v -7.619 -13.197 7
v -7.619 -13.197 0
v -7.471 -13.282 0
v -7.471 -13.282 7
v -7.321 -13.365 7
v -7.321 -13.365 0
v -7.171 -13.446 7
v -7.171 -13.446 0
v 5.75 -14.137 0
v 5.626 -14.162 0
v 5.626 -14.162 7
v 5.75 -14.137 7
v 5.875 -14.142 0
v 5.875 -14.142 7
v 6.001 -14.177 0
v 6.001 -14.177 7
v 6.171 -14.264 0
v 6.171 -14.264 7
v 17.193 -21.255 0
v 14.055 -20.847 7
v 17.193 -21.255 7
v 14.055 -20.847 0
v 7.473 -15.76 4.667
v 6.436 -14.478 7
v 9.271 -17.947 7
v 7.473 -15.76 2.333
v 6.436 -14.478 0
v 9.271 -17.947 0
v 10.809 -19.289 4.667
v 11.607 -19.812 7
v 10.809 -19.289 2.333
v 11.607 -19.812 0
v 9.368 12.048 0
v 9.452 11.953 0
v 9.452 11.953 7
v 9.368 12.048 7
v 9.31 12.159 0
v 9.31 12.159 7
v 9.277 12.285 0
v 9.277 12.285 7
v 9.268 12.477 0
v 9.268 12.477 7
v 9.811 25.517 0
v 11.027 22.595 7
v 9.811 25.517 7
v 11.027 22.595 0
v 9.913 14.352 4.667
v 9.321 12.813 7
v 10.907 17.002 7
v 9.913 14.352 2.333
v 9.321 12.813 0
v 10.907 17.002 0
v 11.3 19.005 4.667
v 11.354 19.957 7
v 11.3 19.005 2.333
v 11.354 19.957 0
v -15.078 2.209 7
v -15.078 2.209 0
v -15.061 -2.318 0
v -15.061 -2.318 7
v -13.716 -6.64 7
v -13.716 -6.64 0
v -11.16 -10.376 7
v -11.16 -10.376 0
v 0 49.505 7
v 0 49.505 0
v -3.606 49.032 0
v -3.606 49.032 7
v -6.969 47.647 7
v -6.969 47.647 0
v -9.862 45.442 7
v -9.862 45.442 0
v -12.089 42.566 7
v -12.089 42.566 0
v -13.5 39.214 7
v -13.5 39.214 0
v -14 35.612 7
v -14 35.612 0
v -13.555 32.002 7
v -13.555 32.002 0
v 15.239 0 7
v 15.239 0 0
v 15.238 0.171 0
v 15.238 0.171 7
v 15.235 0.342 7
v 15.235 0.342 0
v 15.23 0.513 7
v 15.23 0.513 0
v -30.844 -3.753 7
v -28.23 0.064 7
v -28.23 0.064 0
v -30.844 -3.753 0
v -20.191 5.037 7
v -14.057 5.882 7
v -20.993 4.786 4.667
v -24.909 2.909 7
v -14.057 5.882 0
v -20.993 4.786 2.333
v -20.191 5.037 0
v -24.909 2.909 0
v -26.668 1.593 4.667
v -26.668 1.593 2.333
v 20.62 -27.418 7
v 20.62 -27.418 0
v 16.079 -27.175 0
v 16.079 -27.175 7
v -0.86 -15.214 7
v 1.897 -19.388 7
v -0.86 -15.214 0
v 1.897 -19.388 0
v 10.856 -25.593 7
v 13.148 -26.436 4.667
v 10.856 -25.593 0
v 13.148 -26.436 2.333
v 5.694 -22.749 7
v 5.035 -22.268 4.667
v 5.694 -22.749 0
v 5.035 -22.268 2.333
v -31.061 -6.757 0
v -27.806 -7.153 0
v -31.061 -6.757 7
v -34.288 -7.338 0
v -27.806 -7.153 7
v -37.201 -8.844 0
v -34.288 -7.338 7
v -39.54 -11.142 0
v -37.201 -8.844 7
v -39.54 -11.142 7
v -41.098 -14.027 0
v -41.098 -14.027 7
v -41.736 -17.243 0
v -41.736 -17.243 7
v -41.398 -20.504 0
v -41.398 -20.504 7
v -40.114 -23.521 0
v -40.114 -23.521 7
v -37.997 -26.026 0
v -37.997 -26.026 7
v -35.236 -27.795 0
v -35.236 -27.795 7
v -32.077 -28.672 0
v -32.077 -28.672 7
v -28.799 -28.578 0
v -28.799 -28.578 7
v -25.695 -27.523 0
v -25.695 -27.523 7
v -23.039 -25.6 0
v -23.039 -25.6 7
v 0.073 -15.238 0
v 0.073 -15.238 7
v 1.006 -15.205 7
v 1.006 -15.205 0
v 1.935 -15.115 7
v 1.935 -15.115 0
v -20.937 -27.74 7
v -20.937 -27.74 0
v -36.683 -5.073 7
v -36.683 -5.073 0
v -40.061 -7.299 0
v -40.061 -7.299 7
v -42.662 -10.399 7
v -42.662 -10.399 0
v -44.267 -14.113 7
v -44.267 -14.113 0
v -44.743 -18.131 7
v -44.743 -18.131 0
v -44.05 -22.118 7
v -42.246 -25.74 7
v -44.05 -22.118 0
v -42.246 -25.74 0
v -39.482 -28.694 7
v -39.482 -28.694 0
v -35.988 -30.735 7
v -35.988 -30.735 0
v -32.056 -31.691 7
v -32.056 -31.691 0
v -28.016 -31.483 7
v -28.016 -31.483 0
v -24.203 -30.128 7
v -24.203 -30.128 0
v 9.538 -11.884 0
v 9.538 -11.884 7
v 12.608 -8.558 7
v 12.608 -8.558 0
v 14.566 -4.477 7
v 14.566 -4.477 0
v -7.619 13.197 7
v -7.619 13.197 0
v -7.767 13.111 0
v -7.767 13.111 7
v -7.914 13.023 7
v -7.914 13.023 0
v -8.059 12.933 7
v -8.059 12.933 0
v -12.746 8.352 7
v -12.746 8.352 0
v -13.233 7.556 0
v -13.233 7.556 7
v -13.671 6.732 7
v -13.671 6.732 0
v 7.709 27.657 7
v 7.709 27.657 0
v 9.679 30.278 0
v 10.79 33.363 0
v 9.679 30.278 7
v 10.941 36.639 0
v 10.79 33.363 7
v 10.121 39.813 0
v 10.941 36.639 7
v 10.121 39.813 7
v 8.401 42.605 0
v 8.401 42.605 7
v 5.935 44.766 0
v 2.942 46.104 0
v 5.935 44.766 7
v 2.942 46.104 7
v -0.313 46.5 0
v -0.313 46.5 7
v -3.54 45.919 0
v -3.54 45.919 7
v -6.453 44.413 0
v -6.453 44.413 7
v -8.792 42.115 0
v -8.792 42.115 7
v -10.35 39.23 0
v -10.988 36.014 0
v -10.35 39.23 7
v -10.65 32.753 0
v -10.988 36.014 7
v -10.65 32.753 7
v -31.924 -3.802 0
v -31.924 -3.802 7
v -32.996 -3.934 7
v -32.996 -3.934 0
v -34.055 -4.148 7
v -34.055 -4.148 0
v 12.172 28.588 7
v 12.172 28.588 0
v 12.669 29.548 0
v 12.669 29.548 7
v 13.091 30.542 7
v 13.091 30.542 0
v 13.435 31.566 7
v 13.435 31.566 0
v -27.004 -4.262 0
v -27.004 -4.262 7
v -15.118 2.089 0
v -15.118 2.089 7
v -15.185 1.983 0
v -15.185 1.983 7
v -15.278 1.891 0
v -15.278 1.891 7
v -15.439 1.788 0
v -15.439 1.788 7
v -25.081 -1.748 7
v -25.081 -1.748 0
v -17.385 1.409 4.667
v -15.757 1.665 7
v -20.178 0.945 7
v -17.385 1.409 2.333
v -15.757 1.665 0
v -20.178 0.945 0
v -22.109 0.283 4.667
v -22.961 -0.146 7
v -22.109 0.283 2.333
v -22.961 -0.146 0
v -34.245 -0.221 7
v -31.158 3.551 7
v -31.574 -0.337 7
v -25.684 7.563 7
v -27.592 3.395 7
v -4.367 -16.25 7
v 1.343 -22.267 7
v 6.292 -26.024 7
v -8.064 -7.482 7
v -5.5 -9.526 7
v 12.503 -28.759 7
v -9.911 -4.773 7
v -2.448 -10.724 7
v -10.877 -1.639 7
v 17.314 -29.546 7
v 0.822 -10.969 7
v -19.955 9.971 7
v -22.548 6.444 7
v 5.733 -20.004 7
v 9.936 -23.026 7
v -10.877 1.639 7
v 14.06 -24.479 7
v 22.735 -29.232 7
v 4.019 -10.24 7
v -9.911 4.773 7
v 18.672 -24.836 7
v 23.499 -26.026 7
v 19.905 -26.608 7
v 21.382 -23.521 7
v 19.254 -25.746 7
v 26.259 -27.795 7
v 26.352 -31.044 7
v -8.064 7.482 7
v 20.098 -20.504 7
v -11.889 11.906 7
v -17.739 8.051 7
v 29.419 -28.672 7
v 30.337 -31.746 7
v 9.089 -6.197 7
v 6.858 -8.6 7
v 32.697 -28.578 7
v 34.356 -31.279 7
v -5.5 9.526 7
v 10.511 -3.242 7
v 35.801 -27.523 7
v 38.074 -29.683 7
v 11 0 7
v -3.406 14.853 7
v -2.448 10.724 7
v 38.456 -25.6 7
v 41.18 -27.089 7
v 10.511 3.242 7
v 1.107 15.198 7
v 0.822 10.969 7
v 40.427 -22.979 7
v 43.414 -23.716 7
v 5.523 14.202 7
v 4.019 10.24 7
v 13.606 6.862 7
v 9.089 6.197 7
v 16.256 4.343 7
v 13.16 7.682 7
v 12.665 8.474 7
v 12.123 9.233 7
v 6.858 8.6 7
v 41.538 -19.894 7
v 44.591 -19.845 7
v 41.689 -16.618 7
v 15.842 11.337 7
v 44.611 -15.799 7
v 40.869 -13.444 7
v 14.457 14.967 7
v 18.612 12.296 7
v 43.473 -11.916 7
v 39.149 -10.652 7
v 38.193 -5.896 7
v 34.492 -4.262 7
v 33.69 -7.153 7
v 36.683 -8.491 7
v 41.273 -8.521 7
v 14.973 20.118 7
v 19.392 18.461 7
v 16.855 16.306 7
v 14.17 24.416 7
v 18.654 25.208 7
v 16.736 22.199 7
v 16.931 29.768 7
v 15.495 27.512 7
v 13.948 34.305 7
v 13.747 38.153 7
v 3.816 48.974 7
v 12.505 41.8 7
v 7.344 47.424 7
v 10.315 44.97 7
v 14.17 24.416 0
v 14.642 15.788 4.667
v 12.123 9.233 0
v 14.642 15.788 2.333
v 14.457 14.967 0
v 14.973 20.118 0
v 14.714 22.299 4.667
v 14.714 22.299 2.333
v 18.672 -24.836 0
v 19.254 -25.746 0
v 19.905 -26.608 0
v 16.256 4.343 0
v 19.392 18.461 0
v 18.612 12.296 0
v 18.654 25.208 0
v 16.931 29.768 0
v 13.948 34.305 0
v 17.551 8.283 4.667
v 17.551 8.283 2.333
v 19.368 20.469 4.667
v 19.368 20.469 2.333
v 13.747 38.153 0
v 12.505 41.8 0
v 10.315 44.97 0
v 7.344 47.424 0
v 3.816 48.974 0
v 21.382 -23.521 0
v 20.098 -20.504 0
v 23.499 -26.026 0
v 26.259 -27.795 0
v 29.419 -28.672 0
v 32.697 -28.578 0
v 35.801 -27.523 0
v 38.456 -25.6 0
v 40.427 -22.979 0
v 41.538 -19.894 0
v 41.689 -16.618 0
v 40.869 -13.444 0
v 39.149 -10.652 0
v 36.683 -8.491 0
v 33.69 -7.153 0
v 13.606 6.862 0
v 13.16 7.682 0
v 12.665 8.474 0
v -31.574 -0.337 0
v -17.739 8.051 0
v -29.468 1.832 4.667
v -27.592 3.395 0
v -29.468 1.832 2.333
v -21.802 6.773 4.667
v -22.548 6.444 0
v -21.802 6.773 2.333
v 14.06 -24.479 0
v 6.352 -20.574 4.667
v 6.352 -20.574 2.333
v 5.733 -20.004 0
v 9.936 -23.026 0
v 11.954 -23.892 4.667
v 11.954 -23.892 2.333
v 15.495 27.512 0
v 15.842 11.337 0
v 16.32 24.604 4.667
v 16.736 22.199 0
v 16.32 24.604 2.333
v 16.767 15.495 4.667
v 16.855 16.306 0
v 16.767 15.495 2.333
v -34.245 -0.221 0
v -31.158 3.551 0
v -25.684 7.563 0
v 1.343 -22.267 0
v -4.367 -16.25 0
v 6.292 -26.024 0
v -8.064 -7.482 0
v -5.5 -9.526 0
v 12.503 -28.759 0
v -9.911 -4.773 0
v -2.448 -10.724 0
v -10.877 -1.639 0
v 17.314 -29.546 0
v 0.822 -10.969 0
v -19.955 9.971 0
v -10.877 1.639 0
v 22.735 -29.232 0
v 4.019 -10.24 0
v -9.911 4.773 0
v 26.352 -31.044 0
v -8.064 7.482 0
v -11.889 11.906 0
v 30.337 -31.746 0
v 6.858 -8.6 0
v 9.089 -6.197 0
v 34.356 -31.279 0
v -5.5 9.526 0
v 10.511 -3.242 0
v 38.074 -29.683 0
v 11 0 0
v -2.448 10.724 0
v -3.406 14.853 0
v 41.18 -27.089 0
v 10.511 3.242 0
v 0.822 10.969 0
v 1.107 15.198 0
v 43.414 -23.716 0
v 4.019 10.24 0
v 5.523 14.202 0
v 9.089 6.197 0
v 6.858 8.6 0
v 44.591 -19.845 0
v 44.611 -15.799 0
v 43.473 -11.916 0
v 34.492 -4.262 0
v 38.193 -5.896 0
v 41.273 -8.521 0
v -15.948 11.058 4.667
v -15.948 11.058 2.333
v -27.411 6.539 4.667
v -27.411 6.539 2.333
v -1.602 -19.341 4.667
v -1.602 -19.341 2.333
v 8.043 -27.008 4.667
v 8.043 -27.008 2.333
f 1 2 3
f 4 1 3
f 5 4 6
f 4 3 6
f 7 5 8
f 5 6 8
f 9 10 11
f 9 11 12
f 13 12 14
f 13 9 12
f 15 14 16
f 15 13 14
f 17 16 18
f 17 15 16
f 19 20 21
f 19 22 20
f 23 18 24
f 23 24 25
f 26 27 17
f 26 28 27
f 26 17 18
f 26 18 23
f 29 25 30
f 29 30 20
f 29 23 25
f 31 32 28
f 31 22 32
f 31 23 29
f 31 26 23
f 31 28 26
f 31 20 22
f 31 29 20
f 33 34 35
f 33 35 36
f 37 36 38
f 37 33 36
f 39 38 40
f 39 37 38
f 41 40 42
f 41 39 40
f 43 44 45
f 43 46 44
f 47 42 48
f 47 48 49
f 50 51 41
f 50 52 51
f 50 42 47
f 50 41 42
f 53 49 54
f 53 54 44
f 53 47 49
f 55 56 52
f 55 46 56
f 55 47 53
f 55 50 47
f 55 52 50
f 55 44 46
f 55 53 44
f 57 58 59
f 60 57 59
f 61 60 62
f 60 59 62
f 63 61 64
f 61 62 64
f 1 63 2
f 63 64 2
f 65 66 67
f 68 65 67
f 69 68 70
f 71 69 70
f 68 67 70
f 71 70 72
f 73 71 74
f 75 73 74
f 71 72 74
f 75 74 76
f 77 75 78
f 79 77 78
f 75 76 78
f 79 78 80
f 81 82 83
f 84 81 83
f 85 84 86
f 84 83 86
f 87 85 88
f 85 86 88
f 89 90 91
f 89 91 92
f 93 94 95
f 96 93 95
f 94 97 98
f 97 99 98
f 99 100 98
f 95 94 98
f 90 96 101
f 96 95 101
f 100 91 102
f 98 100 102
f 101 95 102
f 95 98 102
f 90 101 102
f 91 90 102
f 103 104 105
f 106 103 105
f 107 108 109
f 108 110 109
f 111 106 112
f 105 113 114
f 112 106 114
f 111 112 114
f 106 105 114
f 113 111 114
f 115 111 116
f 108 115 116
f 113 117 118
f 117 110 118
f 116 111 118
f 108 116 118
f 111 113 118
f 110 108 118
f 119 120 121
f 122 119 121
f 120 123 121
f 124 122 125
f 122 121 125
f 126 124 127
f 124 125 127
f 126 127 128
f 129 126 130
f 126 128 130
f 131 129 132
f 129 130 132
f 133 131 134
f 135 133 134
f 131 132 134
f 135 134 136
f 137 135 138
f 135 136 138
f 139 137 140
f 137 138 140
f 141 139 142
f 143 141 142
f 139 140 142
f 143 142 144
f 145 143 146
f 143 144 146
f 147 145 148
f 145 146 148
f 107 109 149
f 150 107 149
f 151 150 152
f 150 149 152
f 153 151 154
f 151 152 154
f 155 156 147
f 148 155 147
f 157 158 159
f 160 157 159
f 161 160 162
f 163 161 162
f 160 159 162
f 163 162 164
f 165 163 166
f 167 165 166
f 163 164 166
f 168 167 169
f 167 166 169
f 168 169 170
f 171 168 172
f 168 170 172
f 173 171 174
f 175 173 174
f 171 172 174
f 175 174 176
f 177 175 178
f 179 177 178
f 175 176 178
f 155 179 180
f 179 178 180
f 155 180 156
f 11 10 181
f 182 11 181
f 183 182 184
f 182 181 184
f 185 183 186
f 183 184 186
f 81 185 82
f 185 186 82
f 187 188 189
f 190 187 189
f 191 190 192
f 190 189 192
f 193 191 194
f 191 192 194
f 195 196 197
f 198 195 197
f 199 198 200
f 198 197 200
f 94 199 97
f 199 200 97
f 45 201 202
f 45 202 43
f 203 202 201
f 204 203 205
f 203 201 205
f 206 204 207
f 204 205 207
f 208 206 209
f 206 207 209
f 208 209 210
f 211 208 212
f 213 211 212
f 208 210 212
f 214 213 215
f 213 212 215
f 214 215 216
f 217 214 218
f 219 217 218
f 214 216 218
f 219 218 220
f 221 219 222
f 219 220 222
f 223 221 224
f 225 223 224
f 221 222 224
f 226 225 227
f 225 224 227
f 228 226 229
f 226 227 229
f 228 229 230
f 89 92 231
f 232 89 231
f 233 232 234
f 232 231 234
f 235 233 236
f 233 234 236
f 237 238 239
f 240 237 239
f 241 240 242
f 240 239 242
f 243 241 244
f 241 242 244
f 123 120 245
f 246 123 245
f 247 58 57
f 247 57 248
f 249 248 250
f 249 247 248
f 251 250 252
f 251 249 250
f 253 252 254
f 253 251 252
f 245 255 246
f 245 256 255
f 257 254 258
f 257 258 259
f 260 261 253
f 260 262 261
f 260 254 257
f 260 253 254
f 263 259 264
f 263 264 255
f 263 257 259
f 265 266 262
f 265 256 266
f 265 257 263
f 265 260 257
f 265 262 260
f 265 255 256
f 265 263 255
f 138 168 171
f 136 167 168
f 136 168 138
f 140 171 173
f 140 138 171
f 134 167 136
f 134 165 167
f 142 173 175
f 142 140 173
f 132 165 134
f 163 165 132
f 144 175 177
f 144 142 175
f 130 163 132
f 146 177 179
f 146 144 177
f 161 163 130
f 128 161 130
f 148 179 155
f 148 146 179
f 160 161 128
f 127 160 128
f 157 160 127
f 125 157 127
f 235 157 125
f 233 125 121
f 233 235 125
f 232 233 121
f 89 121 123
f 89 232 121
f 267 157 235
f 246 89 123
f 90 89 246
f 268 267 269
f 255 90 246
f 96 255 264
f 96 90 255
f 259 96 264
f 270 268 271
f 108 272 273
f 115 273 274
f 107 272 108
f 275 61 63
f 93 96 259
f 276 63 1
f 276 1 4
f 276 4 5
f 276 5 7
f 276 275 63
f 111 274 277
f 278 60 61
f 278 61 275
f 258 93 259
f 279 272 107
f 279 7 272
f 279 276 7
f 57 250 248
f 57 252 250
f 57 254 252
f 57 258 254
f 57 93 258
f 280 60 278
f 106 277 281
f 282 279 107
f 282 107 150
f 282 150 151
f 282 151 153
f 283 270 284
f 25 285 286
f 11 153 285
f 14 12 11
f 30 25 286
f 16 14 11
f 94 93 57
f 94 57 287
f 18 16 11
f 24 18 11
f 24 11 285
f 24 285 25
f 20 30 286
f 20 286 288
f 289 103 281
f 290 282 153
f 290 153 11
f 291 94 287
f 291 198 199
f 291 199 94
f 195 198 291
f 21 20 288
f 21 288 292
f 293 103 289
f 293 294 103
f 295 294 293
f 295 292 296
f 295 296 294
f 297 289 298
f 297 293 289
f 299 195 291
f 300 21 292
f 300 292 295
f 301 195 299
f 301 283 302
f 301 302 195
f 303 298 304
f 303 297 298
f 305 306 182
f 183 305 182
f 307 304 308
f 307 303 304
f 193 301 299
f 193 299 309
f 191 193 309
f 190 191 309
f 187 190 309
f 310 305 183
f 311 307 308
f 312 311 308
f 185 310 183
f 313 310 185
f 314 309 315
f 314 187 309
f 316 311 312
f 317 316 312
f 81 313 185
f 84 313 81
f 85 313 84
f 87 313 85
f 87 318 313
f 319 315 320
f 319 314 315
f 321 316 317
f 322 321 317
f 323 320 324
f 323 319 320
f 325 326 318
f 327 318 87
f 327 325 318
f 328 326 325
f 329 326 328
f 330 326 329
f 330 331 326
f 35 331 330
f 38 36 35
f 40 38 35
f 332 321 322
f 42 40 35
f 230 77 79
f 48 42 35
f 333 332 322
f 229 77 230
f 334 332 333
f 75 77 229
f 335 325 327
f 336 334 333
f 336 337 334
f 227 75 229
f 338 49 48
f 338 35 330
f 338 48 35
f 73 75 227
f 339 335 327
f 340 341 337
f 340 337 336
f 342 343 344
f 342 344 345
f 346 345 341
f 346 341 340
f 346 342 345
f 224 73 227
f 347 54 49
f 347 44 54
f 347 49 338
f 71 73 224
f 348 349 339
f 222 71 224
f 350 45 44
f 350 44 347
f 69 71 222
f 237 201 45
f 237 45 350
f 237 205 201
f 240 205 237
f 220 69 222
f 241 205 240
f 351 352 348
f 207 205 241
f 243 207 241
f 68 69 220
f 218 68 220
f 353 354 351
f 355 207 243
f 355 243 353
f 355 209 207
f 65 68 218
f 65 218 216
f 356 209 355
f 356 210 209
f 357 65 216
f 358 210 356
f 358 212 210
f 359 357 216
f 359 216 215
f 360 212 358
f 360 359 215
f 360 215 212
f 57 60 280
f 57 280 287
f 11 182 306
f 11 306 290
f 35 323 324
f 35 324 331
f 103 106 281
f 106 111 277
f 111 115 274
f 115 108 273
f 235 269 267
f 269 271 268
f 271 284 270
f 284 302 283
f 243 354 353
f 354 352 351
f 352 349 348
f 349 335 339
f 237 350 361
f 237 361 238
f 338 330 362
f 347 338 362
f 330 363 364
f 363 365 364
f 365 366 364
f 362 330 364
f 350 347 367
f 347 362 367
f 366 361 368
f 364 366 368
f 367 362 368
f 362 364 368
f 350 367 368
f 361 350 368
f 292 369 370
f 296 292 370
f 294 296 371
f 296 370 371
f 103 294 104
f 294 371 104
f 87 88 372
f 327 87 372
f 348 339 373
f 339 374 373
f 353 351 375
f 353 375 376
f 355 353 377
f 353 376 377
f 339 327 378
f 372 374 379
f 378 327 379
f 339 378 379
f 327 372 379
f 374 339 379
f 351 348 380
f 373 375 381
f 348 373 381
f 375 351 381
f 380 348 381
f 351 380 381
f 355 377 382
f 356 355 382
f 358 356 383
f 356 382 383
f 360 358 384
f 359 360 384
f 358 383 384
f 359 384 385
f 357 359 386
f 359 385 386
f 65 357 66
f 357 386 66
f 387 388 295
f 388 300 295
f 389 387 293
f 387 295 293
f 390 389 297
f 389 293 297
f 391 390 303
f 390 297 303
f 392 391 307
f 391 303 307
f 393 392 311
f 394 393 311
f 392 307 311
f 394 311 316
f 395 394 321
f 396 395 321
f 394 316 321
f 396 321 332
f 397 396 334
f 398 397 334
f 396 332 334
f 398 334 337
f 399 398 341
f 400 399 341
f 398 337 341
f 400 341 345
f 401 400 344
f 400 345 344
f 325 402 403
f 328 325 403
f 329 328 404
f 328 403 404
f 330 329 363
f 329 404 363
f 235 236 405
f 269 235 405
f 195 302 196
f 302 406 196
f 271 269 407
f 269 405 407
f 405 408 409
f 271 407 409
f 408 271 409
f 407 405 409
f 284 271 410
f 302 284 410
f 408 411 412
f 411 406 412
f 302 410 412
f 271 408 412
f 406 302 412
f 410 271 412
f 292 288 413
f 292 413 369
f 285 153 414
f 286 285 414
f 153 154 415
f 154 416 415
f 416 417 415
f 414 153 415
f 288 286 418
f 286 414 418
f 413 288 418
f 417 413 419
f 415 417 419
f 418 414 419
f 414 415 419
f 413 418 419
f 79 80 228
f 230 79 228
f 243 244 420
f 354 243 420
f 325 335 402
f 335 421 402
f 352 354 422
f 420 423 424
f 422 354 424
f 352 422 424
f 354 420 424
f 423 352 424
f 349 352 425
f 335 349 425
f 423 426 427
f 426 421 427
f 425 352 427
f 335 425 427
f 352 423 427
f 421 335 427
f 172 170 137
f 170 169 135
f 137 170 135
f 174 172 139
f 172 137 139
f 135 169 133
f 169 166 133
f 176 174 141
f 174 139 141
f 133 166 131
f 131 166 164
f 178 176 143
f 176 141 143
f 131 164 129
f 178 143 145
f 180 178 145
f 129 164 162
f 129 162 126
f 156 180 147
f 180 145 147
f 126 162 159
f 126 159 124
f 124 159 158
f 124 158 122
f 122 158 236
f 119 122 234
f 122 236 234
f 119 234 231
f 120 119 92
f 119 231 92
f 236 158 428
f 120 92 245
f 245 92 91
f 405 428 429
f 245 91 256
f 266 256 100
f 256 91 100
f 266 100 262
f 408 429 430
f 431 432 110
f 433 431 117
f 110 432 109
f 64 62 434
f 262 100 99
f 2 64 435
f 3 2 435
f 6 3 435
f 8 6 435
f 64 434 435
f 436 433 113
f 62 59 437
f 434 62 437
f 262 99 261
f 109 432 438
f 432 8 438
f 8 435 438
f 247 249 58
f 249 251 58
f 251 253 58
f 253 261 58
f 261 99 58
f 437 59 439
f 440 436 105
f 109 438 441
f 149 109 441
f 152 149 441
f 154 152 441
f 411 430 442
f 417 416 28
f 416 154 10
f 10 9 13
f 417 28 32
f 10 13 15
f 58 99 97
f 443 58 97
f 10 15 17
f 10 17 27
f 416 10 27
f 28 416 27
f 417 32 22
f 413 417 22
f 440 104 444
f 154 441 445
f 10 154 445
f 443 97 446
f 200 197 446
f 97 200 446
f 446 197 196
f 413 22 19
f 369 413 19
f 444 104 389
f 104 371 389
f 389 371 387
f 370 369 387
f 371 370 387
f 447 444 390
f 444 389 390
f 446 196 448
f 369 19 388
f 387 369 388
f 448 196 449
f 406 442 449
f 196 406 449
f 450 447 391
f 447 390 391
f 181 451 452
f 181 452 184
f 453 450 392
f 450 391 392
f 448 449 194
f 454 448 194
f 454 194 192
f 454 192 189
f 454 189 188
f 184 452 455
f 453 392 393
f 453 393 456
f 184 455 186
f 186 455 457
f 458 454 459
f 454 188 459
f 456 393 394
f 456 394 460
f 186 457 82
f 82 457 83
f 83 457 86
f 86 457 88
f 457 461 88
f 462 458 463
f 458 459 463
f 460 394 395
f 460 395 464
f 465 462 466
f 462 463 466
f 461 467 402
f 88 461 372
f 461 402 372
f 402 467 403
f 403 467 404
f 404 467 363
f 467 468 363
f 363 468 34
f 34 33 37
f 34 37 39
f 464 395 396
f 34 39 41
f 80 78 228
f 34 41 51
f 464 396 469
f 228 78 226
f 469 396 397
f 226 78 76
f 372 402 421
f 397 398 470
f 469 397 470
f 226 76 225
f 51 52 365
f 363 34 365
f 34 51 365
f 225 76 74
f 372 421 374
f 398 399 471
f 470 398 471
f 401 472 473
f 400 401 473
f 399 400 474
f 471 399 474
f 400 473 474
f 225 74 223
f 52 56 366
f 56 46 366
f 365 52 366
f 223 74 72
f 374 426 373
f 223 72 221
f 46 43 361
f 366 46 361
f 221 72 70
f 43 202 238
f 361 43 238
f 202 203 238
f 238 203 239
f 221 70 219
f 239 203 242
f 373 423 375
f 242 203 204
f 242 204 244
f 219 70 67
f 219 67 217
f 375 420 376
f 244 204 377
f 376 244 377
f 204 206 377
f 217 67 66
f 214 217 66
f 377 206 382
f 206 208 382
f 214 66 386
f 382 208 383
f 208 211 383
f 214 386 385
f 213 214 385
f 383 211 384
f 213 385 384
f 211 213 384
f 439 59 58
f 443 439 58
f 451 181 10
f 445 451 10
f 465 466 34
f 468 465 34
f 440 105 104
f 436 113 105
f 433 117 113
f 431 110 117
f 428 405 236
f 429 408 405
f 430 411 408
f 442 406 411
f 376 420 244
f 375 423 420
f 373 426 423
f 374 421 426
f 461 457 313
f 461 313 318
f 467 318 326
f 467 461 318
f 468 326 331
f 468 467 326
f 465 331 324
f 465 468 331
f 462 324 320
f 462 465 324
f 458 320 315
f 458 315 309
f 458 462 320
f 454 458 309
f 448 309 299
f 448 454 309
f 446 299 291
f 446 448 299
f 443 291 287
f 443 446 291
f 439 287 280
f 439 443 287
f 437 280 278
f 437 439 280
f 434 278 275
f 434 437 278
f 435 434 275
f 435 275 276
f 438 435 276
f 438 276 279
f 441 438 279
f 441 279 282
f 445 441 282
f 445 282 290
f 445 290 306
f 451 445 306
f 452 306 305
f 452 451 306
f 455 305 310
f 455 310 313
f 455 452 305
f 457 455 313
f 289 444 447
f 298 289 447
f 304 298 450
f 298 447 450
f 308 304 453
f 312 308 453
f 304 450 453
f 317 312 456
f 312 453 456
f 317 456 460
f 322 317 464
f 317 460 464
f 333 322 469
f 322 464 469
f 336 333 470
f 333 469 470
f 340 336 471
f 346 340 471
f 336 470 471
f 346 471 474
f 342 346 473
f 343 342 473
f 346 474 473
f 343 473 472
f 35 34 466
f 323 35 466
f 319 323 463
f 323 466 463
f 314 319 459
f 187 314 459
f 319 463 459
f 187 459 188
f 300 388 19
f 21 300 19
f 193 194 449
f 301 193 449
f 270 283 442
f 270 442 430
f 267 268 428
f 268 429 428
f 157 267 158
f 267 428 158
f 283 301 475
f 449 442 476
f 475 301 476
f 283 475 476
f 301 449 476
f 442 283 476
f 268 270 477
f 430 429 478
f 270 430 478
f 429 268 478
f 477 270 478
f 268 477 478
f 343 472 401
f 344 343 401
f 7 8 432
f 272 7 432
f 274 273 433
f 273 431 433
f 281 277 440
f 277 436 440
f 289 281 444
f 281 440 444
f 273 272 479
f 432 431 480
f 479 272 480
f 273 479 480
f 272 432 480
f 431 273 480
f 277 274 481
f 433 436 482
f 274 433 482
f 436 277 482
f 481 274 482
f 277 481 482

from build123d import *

# Parameters (mm, degrees)
F0_R     = 11
F1_DEPTH = 7
F2_D     = 22


with BuildPart() as f1:
    # F0 (on Top) → F1 (new body)
    with BuildSketch(Plane.XY):
        with BuildLine():
            Line((0, 49.5046585807), (0, 48.5046585807))
            Line((0, 48.5046585807), (0, 46.5046585807))
            ThreePointArc((0, 46.5046585807), (10.1813410196, 39.6688265699), (7.7085117019, 27.6574394974))
            Line((7.7085117019, 27.6574394974), (9.8108330751, 25.5172888383))
            ThreePointArc((9.8108330751, 25.5172888383), (11.0983257909, 26.9707752537), (12.1723308709, 28.588419634))
            ThreePointArc((12.1723308709, 28.588419634), (12.8897911228, 30.0408426238), (13.4346674784, 31.566421698))
            ThreePointArc((13.4346674784, 31.566421698), (13.7598632413, 32.9227671072), (13.9484835753, 34.3047394379))
            ThreePointArc((13.9484835753, 34.3047394379), (10.3150101309, 44.970416131), (0, 49.5046585807))
        make_face()
        with BuildLine():
            Line((0, 46.5046585807), (0, 48.5046585807))
            Line((0, 48.5046585807), (0, 49.5046585807))
            ThreePointArc((0, 49.5046585807), (-11.068840076, 44.0767516373), (-13.5547324515, 32.0019127766))
            Line((-13.5547324515, 32.0019127766), (-10.6501469262, 32.7525011632))
            ThreePointArc((-10.6501469262, 32.7525011632), (-8.696945774, 42.2398745538), (0, 46.5046585807))
        make_face()
        with BuildLine():
            ThreePointArc((7.7085117019, 27.6574394974), (10.1813410196, 39.6688265699), (0, 46.5046585807))
            Line((0, 46.5046585807), (0, 39.5046585807))
            ThreePointArc((0, 39.5046585807), (2.8284271247, 38.3330857055), (4, 35.5046585807))
            ThreePointArc((4, 35.5046585807), (3.6886569817, 33.9574644522), (2.8030951643, 32.6511243686))
            Line((2.8030951643, 32.6511243686), (7.7085117019, 27.6574394974))
        make_face()
        with BuildLine():
            Line((0, 39.5046585807), (0, 46.5046585807))
            ThreePointArc((0, 46.5046585807), (-8.696945774, 42.2398745538), (-10.6501469262, 32.7525011632))
            Line((-10.6501469262, 32.7525011632), (-3.8727807004, 34.5038740653))
            ThreePointArc((-3.8727807004, 34.5038740653), (-3.162525736, 37.9538280255), (0, 39.5046585807))
        make_face()
        with BuildLine():
            ThreePointArc((4, 35.5046585807), (2.8284271247, 38.3330857055), (0, 39.5046585807))
            Line((0, 39.5046585807), (0, 35.5046585807))
            Line((0, 35.5046585807), (2.8030951643, 32.6511243686))
            ThreePointArc((2.8030951643, 32.6511243686), (3.6886569817, 33.9574644522), (4, 35.5046585807))
        make_face()
        with BuildLine():
            Line((0, 35.5046585807), (0, 39.5046585807))
            ThreePointArc((0, 39.5046585807), (-3.162525736, 37.9538280255), (-3.8727807004, 34.5038740653))
            Line((-3.8727807004, 34.5038740653), (0, 35.5046585807))
        make_face()
        with BuildLine():
            add(Edge.make_bspline(
                [(15.2299184457, 0.5132023359), (15.5574350677, 5.1525312386), (25.2311147708, 20.5664775316), (13.9484835753, 34.3047394379)],
                knots=[1.3457221099, 1.3457221099, 1.3457221099, 1.3457221099, 34.3289885081, 34.3289885081, 34.3289885081, 34.3289885081], degree=3))
            ThreePointArc((13.9484835753, 34.3047394379), (13.7598632413, 32.9227671072), (13.4346674784, 31.566421698))
            add(Edge.make_bspline(
                [(13.4346674784, 31.566421698), (17.1492826194, 26.552028954), (18.9610160887, 14.381878078), (13.6060726459, 6.8621118948)],
                knots=[0, 0, 0, 0, 24.7049044237, 24.7049044237, 24.7049044237, 24.7049044237], degree=3))
            ThreePointArc((13.6060726459, 6.8621118948), (14.7633247849, 3.7759811699), (15.2299184457, 0.5132023359))
        make_face()
        with BuildLine():
            Line((2.8030951643, 32.6511243686), (0, 35.5046585807))
            Line((0, 35.5046585807), (-3.8727807004, 34.5038740653))
            ThreePointArc((-3.8727807004, 34.5038740653), (-1.0696855361, 31.6503398532), (2.8030951643, 32.6511243686))
        make_face()
        with BuildLine():
            ThreePointArc((12.1723308709, 28.588419634), (11.0983257909, 26.9707752537), (9.8108330751, 25.5172888383))
            add(Edge.make_bspline(
                [(9.4517272848, 11.9531855099), (8.1816991863, 13.0922129173), (14.0057700702, 18.2080167226), (9.8108330751, 25.5172888383)],
                knots=[0.1803540845, 0.1803540845, 0.1803540845, 0.1803540845, 13.6112300964, 13.6112300964, 13.6112300964, 13.6112300964], degree=3))
            ThreePointArc((9.4517272848, 11.9531855099), (9.4792735432, 11.9313522115), (9.5067693672, 11.9094554326))
            ThreePointArc((9.5067693672, 11.9094554326), (10.8973285777, 10.6518553487), (12.122925882, 9.2330092906))
            add(Edge.make_bspline(
                [(12.122925882, 9.2330092906), (15.8085282892, 15.7495811582), (16.0773210227, 22.4694218487), (12.1723308709, 28.588419634)],
                knots=[0, 0, 0, 0, 19.3554733968, 19.3554733968, 19.3554733968, 19.3554733968], degree=3))
        make_face()
        with BuildLine():
            add(Edge.make_bspline(
                [(15.2385626783, 0), (15.2187511021, 0.1525677237), (15.2165557195, 0.3239170357), (15.2299184457, 0.5132023359)],
                knots=[0, 0, 0, 0, 1.3457221099, 1.3457221099, 1.3457221099, 1.3457221099], degree=3))
            ThreePointArc((15.2299184457, 0.5132023359), (14.7633247849, 3.7759811699), (13.6060726459, 6.8621118948))
            ThreePointArc((13.6060726459, 6.8621118948), (12.9190026677, 8.0816559302), (12.122925882, 9.2330092906))
            ThreePointArc((12.122925882, 9.2330092906), (10.8973285777, 10.6518553487), (9.5067693672, 11.9094554326))
            add(Edge.make_bspline(
                [(9.5067693672, 11.9094554326), (9.4871151753, 11.923312155), (9.468781627, 11.9378902868), (9.4517272848, 11.9531855099)],
                knots=[0, 0, 0, 0, 0.1803540845, 0.1803540845, 0.1803540845, 0.1803540845], degree=3))
            ThreePointArc((9.4517272848, 11.9531855099), (1.1073491815, 15.1982752407), (-7.6192813392, 13.1969823966))
            add(Edge.make_bspline(
                [(-7.6192813392, 13.1969823966), (-7.7415030756, 13.1035412064), (-7.8887982414, 13.0159652933), (-8.059405483, 12.9328951036)],
                knots=[0, 0, 0, 0, 1.3457221099, 1.3457221099, 1.3457221099, 1.3457221099], degree=3))
            ThreePointArc((-8.059405483, 12.9328951036), (-10.6517580098, 10.8974237231), (-12.7457995474, 8.3521486097))
            ThreePointArc((-12.7457995474, 8.3521486097), (-13.458420674, 7.1473565367), (-14.05748354, 5.8822571367))
            ThreePointArc((-14.05748354, 5.8822571367), (-14.6734416183, 4.1114357074), (-15.0672756334, 2.2783760636))
            add(Edge.make_bspline(
                [(-15.0672756334, 2.2783760636), (-15.0694488111, 2.2544266729), (-15.0729070695, 2.2312602885), (-15.0776259502, 2.2088431833)],
                knots=[0, 0, 0, 0, 0.1803540845, 0.1803540845, 0.1803540845, 0.1803540845], degree=3))
            ThreePointArc((-15.0776259502, 2.2088431833), (-13.7157670429, -6.6401450983), (-7.6192813392, -13.1969823966))
            add(Edge.make_bspline(
                [(-7.6192813392, -13.1969823966), (-7.4772480265, -13.2561089301), (-7.3277574781, -13.339882329), (-7.1705129627, -13.4460974395)],
                knots=[0, 0, 0, 0, 1.3457221099, 1.3457221099, 1.3457221099, 1.3457221099], degree=3))
            ThreePointArc((-7.1705129627, -13.4460974395), (-4.1115667751, -14.673404893), (-0.8602730984, -15.2142605045))
            ThreePointArc((-0.8602730984, -15.2142605045), (0.5394180063, -15.2290124669), (1.934557658, -15.1152664273))
            ThreePointArc((1.934557658, -15.1152664273), (3.7761130406, -14.7632910561), (5.5605062662, -14.1878314962))
            add(Edge.make_bspline(
                [(5.5605062662, -14.1878314962), (5.5823336358, -14.1777388279), (5.6041254425, -14.1691505753), (5.6258986653, -14.1620286933)],
                knots=[0, 0, 0, 0, 0.1803540845, 0.1803540845, 0.1803540845, 0.1803540845], degree=3))
            ThreePointArc((5.6258986653, -14.1620286933), (12.6084178614, -8.5581301424), (15.2385626783, 0))
        make_face()
        Circle(F0_R, mode=Mode.SUBTRACT)
        with BuildLine():
            ThreePointArc((15.2385626783, 0), (15.2364014669, 0.2566375656), (15.2299184457, 0.5132023359))
            add(Edge.make_bspline(
                [(15.2385626783, 0), (15.2187511021, 0.1525677237), (15.2165557195, 0.3239170357), (15.2299184457, 0.5132023359)],
                knots=[0, 0, 0, 0, 1.3457221099, 1.3457221099, 1.3457221099, 1.3457221099], degree=3))
        make_face()
        with BuildLine():
            ThreePointArc((9.5067693672, 11.9094554326), (9.4792735432, 11.9313522115), (9.4517272848, 11.9531855099))
            add(Edge.make_bspline(
                [(9.5067693672, 11.9094554326), (9.4871151753, 11.923312155), (9.468781627, 11.9378902868), (9.4517272848, 11.9531855099)],
                knots=[0, 0, 0, 0, 0.1803540845, 0.1803540845, 0.1803540845, 0.1803540845], degree=3))
        make_face()
        with BuildLine():
            add(Edge.make_bspline(
                [(-7.6192813392, 13.1969823966), (-7.7415030756, 13.1035412064), (-7.8887982414, 13.0159652933), (-8.059405483, 12.9328951036)],
                knots=[0, 0, 0, 0, 1.3457221099, 1.3457221099, 1.3457221099, 1.3457221099], degree=3))
            ThreePointArc((-7.6192813392, 13.1969823966), (-7.8404553848, 13.0667919498), (-8.059405483, 12.9328951036))
        make_face()
        with BuildLine():
            add(Edge.make_bspline(
                [(5.6258986653, -14.1620286933), (7.247339385, -13.6316658001), (8.7657199992, -21.2333610417), (17.1932038321, -21.2550750945)],
                knots=[0.1803540845, 0.1803540845, 0.1803540845, 0.1803540845, 13.6112300964, 13.6112300964, 13.6112300964, 13.6112300964], degree=3))
            ThreePointArc((5.6258986653, -14.1620286933), (5.5932173451, -14.1749678036), (5.5605062662, -14.1878314962))
            ThreePointArc((5.5605062662, -14.1878314962), (3.7761130406, -14.7632910561), (1.934557658, -15.1152664273))
            add(Edge.make_bspline(
                [(1.934557658, -15.1152664273), (5.7352732373, -21.565377674), (11.4204296179, -25.1580793548), (18.6721322216, -24.8357575745)],
                knots=[0, 0, 0, 0, 19.3554733968, 19.3554733968, 19.3554733968, 19.3554733968], degree=3))
            ThreePointArc((18.6721322216, -24.8357575745), (17.808213634, -23.0968197012), (17.1932038321, -21.2550750945))
        make_face()
        with BuildLine():
            ThreePointArc((5.5605062662, -14.1878314962), (5.5932173451, -14.1749678036), (5.6258986653, -14.1620286933))
            add(Edge.make_bspline(
                [(5.5605062662, -14.1878314962), (5.5823336358, -14.1777388279), (5.6041254425, -14.1691505753), (5.6258986653, -14.1620286933)],
                knots=[0, 0, 0, 0, 0.1803540845, 0.1803540845, 0.1803540845, 0.1803540845], degree=3))
        make_face()
        with BuildLine():
            ThreePointArc((-12.7457995474, 8.3521486097), (-10.6517580098, 10.8974237231), (-8.059405483, 12.9328951036))
            add(Edge.make_bspline(
                [(-8.059405483, 12.9328951036), (-12.2409404802, 10.896868367), (-30.4266493942, 11.5675475915), (-36.683017611, -5.0726285984)],
                knots=[1.3457221099, 1.3457221099, 1.3457221099, 1.3457221099, 34.3289885081, 34.3289885081, 34.3289885081, 34.3289885081], degree=3))
            ThreePointArc((-36.683017611, -5.0726285984), (-35.3918842983, -4.544992434), (-34.0546568363, -4.1484475213))
            add(Edge.make_bspline(
                [(-34.0546568363, -4.1484475213), (-31.5693729059, 1.575699928), (-21.935579814, 9.2297825754), (-12.7457995474, 8.3521486097)],
                knots=[0, 0, 0, 0, 24.7049044237, 24.7049044237, 24.7049044237, 24.7049044237], degree=3))
        make_face()
        with BuildLine():
            Line((20.0977893574, -20.5044867079), (17.1932038321, -21.2550750945))
            ThreePointArc((17.1932038321, -21.2550750945), (17.808213634, -23.0968197012), (18.6721322216, -24.8357575745))
            ThreePointArc((18.6721322216, -24.8357575745), (19.5712373019, -26.1833078737), (20.6199893579, -27.4179741767))
            ThreePointArc((20.6199893579, -27.4179741767), (21.6320210571, -28.3777746731), (22.7345340357, -29.2321108394))
            ThreePointArc((22.7345340357, -29.2321108394), (43.4140763402, -23.7162957613), (34.49183566, -4.2622137438))
            Line((34.49183566, -4.2622137438), (33.6895715079, -7.1529527895))
            ThreePointArc((33.6895715079, -7.1529527895), (38.4564479855, -25.5995483737), (20.0977893574, -20.5044867079))
        make_face()
        with BuildLine():
            ThreePointArc((-34.0546568363, -4.1484475213), (-35.3918842983, -4.544992434), (-36.683017611, -5.0726285984))
            ThreePointArc((-36.683017611, -5.0726285984), (-42.2459527831, -25.7395451118), (-20.9371032085, -27.7396990328))
            Line((-20.9371032085, -27.7396990328), (-23.0394245817, -25.5995483737))
            ThreePointArc((-23.0394245817, -25.5995483737), (-41.3980832098, -20.5044867079), (-27.8063010593, -7.1529527895))
            Line((-27.8063010593, -7.1529527895), (-27.0040369072, -4.2622137438))
            ThreePointArc((-27.0040369072, -4.2622137438), (-28.9065394249, -3.8739555525), (-30.8444630925, -3.7526620595))
            ThreePointArc((-30.8444630925, -3.7526620595), (-32.4610284247, -3.8575347501), (-34.0546568363, -4.1484475213))
        make_face()
        with BuildLine():
            Line((26.8751555832, -18.7531138058), (20.0977893574, -20.5044867079))
            ThreePointArc((20.0977893574, -20.5044867079), (38.4564479855, -25.5995483737), (33.6895715079, -7.1529527895))
            Line((33.6895715079, -7.1529527895), (31.8176218197, -13.8980105628))
            ThreePointArc((31.8176218197, -13.8980105628), (33.9321741944, -15.3314557026), (34.7479362836, -17.7523292904))
            ThreePointArc((34.7479362836, -17.7523292904), (31.2523553546, -21.7203970066), (26.8751555832, -18.7531138058))
        make_face()
        with BuildLine():
            ThreePointArc((-15.0672756334, 2.2783760636), (-14.6734416183, 4.1114357074), (-14.05748354, 5.8822571367))
            add(Edge.make_bspline(
                [(-14.05748354, 5.8822571367), (-21.5438015265, 5.8157965158), (-27.4977506407, 2.6886575062), (-30.8444630925, -3.7526620595)],
                knots=[0, 0, 0, 0, 19.3554733968, 19.3554733968, 19.3554733968, 19.3554733968], degree=3))
            ThreePointArc((-30.8444630925, -3.7526620595), (-28.9065394249, -3.8739555525), (-27.0040369072, -4.2622137438))
            add(Edge.make_bspline(
                [(-15.0776259502, 2.2088431833), (-15.4290385713, 0.5394528828), (-22.7714900694, 3.025344319), (-27.0040369072, -4.2622137438)],
                knots=[0.1803540845, 0.1803540845, 0.1803540845, 0.1803540845, 13.6112300964, 13.6112300964, 13.6112300964, 13.6112300964], degree=3))
            ThreePointArc((-15.0776259502, 2.2088431833), (-15.0724908883, 2.243615592), (-15.0672756334, 2.2783760636))
        make_face()
        with BuildLine():
            add(Edge.make_bspline(
                [(20.6199893579, -27.4179741767), (14.4200902865, -28.1277288821), (2.9745637253, -23.6116606534), (-0.8602730984, -15.2142605045)],
                knots=[0, 0, 0, 0, 24.7049044237, 24.7049044237, 24.7049044237, 24.7049044237], degree=3))
            ThreePointArc((-0.8602730984, -15.2142605045), (-4.1115667751, -14.673404893), (-7.1705129627, -13.4460974395))
            add(Edge.make_bspline(
                [(-7.1705129627, -13.4460974395), (-3.3164945874, -16.0493996056), (5.1955346233, -32.1340251231), (22.7345340357, -29.2321108394)],
                knots=[1.3457221099, 1.3457221099, 1.3457221099, 1.3457221099, 34.3289885081, 34.3289885081, 34.3289885081, 34.3289885081], degree=3))
            ThreePointArc((22.7345340357, -29.2321108394), (21.6320210571, -28.3777746731), (20.6199893579, -27.4179741767))
        make_face()
        with BuildLine():
            Line((30.7479362836, -17.7523292904), (26.8751555832, -18.7531138058))
            ThreePointArc((26.8751555832, -18.7531138058), (31.2523553546, -21.7203970066), (34.7479362836, -17.7523292904))
            ThreePointArc((34.7479362836, -17.7523292904), (33.9321741944, -15.3314557026), (31.8176218197, -13.8980105628))
            Line((31.8176218197, -13.8980105628), (30.7479362836, -17.7523292904))
        make_face()
        with BuildLine():
            ThreePointArc((31.8176218197, -13.8980105628), (27.9448411193, -14.8987950782), (26.8751555832, -18.7531138058))
            Line((26.8751555832, -18.7531138058), (30.7479362836, -17.7523292904))
            Line((30.7479362836, -17.7523292904), (31.8176218197, -13.8980105628))
        make_face()
        with BuildLine():
            add(Edge.make_bspline(
                [(-15.0672756334, 2.2783760636), (-15.0694488111, 2.2544266729), (-15.0729070695, 2.2312602885), (-15.0776259502, 2.2088431833)],
                knots=[0, 0, 0, 0, 0.1803540845, 0.1803540845, 0.1803540845, 0.1803540845], degree=3))
            ThreePointArc((-15.0672756334, 2.2783760636), (-15.0724908883, 2.243615592), (-15.0776259502, 2.2088431833))
        make_face()
        with BuildLine():
            ThreePointArc((-27.8063010593, -7.1529527895), (-41.3980832098, -20.5044867079), (-23.0394245817, -25.5995483737))
            Line((-23.0394245817, -25.5995483737), (-27.9448411193, -20.6058635025))
            ThreePointArc((-27.9448411193, -20.6058635025), (-34.620716984, -18.7531138058), (-29.6782507475, -13.8980105628))
            Line((-29.6782507475, -13.8980105628), (-27.8063010593, -7.1529527895))
        make_face()
        with BuildLine():
            ThreePointArc((-7.6192813392, -13.1969823966), (-7.3959460821, -13.3234295154), (-7.1705129627, -13.4460974395))
            add(Edge.make_bspline(
                [(-7.6192813392, -13.1969823966), (-7.4772480265, -13.2561089301), (-7.3277574781, -13.339882329), (-7.1705129627, -13.4460974395)],
                knots=[0, 0, 0, 0, 1.3457221099, 1.3457221099, 1.3457221099, 1.3457221099], degree=3))
        make_face()
        with BuildLine():
            Line((-30.7479362836, -17.7523292904), (-27.9448411193, -20.6058635025))
            ThreePointArc((-27.9448411193, -20.6058635025), (-27.0592793019, -19.2995234189), (-26.7479362836, -17.7523292904))
            ThreePointArc((-26.7479362836, -17.7523292904), (-27.5636983729, -15.3314557026), (-29.6782507475, -13.8980105628))
            Line((-29.6782507475, -13.8980105628), (-30.7479362836, -17.7523292904))
        make_face()
        with BuildLine():
            ThreePointArc((-29.6782507475, -13.8980105628), (-34.620716984, -18.7531138058), (-27.9448411193, -20.6058635025))
            Line((-27.9448411193, -20.6058635025), (-30.7479362836, -17.7523292904))
            Line((-30.7479362836, -17.7523292904), (-29.6782507475, -13.8980105628))
        make_face()
    extrude(amount=F1_DEPTH)

    # F2 (through all)
    with Locations(Plane(origin=(0, 0, 0), x_dir=(1, 0, 0), z_dir=(0, 0, -1))):
        with Locations((0, -35.5046585807), (30.7479362836, 17.7523292904), (-30.7479362836, 17.7523292904)):
            Hole(F2_D / 2)


solid = f1.part
